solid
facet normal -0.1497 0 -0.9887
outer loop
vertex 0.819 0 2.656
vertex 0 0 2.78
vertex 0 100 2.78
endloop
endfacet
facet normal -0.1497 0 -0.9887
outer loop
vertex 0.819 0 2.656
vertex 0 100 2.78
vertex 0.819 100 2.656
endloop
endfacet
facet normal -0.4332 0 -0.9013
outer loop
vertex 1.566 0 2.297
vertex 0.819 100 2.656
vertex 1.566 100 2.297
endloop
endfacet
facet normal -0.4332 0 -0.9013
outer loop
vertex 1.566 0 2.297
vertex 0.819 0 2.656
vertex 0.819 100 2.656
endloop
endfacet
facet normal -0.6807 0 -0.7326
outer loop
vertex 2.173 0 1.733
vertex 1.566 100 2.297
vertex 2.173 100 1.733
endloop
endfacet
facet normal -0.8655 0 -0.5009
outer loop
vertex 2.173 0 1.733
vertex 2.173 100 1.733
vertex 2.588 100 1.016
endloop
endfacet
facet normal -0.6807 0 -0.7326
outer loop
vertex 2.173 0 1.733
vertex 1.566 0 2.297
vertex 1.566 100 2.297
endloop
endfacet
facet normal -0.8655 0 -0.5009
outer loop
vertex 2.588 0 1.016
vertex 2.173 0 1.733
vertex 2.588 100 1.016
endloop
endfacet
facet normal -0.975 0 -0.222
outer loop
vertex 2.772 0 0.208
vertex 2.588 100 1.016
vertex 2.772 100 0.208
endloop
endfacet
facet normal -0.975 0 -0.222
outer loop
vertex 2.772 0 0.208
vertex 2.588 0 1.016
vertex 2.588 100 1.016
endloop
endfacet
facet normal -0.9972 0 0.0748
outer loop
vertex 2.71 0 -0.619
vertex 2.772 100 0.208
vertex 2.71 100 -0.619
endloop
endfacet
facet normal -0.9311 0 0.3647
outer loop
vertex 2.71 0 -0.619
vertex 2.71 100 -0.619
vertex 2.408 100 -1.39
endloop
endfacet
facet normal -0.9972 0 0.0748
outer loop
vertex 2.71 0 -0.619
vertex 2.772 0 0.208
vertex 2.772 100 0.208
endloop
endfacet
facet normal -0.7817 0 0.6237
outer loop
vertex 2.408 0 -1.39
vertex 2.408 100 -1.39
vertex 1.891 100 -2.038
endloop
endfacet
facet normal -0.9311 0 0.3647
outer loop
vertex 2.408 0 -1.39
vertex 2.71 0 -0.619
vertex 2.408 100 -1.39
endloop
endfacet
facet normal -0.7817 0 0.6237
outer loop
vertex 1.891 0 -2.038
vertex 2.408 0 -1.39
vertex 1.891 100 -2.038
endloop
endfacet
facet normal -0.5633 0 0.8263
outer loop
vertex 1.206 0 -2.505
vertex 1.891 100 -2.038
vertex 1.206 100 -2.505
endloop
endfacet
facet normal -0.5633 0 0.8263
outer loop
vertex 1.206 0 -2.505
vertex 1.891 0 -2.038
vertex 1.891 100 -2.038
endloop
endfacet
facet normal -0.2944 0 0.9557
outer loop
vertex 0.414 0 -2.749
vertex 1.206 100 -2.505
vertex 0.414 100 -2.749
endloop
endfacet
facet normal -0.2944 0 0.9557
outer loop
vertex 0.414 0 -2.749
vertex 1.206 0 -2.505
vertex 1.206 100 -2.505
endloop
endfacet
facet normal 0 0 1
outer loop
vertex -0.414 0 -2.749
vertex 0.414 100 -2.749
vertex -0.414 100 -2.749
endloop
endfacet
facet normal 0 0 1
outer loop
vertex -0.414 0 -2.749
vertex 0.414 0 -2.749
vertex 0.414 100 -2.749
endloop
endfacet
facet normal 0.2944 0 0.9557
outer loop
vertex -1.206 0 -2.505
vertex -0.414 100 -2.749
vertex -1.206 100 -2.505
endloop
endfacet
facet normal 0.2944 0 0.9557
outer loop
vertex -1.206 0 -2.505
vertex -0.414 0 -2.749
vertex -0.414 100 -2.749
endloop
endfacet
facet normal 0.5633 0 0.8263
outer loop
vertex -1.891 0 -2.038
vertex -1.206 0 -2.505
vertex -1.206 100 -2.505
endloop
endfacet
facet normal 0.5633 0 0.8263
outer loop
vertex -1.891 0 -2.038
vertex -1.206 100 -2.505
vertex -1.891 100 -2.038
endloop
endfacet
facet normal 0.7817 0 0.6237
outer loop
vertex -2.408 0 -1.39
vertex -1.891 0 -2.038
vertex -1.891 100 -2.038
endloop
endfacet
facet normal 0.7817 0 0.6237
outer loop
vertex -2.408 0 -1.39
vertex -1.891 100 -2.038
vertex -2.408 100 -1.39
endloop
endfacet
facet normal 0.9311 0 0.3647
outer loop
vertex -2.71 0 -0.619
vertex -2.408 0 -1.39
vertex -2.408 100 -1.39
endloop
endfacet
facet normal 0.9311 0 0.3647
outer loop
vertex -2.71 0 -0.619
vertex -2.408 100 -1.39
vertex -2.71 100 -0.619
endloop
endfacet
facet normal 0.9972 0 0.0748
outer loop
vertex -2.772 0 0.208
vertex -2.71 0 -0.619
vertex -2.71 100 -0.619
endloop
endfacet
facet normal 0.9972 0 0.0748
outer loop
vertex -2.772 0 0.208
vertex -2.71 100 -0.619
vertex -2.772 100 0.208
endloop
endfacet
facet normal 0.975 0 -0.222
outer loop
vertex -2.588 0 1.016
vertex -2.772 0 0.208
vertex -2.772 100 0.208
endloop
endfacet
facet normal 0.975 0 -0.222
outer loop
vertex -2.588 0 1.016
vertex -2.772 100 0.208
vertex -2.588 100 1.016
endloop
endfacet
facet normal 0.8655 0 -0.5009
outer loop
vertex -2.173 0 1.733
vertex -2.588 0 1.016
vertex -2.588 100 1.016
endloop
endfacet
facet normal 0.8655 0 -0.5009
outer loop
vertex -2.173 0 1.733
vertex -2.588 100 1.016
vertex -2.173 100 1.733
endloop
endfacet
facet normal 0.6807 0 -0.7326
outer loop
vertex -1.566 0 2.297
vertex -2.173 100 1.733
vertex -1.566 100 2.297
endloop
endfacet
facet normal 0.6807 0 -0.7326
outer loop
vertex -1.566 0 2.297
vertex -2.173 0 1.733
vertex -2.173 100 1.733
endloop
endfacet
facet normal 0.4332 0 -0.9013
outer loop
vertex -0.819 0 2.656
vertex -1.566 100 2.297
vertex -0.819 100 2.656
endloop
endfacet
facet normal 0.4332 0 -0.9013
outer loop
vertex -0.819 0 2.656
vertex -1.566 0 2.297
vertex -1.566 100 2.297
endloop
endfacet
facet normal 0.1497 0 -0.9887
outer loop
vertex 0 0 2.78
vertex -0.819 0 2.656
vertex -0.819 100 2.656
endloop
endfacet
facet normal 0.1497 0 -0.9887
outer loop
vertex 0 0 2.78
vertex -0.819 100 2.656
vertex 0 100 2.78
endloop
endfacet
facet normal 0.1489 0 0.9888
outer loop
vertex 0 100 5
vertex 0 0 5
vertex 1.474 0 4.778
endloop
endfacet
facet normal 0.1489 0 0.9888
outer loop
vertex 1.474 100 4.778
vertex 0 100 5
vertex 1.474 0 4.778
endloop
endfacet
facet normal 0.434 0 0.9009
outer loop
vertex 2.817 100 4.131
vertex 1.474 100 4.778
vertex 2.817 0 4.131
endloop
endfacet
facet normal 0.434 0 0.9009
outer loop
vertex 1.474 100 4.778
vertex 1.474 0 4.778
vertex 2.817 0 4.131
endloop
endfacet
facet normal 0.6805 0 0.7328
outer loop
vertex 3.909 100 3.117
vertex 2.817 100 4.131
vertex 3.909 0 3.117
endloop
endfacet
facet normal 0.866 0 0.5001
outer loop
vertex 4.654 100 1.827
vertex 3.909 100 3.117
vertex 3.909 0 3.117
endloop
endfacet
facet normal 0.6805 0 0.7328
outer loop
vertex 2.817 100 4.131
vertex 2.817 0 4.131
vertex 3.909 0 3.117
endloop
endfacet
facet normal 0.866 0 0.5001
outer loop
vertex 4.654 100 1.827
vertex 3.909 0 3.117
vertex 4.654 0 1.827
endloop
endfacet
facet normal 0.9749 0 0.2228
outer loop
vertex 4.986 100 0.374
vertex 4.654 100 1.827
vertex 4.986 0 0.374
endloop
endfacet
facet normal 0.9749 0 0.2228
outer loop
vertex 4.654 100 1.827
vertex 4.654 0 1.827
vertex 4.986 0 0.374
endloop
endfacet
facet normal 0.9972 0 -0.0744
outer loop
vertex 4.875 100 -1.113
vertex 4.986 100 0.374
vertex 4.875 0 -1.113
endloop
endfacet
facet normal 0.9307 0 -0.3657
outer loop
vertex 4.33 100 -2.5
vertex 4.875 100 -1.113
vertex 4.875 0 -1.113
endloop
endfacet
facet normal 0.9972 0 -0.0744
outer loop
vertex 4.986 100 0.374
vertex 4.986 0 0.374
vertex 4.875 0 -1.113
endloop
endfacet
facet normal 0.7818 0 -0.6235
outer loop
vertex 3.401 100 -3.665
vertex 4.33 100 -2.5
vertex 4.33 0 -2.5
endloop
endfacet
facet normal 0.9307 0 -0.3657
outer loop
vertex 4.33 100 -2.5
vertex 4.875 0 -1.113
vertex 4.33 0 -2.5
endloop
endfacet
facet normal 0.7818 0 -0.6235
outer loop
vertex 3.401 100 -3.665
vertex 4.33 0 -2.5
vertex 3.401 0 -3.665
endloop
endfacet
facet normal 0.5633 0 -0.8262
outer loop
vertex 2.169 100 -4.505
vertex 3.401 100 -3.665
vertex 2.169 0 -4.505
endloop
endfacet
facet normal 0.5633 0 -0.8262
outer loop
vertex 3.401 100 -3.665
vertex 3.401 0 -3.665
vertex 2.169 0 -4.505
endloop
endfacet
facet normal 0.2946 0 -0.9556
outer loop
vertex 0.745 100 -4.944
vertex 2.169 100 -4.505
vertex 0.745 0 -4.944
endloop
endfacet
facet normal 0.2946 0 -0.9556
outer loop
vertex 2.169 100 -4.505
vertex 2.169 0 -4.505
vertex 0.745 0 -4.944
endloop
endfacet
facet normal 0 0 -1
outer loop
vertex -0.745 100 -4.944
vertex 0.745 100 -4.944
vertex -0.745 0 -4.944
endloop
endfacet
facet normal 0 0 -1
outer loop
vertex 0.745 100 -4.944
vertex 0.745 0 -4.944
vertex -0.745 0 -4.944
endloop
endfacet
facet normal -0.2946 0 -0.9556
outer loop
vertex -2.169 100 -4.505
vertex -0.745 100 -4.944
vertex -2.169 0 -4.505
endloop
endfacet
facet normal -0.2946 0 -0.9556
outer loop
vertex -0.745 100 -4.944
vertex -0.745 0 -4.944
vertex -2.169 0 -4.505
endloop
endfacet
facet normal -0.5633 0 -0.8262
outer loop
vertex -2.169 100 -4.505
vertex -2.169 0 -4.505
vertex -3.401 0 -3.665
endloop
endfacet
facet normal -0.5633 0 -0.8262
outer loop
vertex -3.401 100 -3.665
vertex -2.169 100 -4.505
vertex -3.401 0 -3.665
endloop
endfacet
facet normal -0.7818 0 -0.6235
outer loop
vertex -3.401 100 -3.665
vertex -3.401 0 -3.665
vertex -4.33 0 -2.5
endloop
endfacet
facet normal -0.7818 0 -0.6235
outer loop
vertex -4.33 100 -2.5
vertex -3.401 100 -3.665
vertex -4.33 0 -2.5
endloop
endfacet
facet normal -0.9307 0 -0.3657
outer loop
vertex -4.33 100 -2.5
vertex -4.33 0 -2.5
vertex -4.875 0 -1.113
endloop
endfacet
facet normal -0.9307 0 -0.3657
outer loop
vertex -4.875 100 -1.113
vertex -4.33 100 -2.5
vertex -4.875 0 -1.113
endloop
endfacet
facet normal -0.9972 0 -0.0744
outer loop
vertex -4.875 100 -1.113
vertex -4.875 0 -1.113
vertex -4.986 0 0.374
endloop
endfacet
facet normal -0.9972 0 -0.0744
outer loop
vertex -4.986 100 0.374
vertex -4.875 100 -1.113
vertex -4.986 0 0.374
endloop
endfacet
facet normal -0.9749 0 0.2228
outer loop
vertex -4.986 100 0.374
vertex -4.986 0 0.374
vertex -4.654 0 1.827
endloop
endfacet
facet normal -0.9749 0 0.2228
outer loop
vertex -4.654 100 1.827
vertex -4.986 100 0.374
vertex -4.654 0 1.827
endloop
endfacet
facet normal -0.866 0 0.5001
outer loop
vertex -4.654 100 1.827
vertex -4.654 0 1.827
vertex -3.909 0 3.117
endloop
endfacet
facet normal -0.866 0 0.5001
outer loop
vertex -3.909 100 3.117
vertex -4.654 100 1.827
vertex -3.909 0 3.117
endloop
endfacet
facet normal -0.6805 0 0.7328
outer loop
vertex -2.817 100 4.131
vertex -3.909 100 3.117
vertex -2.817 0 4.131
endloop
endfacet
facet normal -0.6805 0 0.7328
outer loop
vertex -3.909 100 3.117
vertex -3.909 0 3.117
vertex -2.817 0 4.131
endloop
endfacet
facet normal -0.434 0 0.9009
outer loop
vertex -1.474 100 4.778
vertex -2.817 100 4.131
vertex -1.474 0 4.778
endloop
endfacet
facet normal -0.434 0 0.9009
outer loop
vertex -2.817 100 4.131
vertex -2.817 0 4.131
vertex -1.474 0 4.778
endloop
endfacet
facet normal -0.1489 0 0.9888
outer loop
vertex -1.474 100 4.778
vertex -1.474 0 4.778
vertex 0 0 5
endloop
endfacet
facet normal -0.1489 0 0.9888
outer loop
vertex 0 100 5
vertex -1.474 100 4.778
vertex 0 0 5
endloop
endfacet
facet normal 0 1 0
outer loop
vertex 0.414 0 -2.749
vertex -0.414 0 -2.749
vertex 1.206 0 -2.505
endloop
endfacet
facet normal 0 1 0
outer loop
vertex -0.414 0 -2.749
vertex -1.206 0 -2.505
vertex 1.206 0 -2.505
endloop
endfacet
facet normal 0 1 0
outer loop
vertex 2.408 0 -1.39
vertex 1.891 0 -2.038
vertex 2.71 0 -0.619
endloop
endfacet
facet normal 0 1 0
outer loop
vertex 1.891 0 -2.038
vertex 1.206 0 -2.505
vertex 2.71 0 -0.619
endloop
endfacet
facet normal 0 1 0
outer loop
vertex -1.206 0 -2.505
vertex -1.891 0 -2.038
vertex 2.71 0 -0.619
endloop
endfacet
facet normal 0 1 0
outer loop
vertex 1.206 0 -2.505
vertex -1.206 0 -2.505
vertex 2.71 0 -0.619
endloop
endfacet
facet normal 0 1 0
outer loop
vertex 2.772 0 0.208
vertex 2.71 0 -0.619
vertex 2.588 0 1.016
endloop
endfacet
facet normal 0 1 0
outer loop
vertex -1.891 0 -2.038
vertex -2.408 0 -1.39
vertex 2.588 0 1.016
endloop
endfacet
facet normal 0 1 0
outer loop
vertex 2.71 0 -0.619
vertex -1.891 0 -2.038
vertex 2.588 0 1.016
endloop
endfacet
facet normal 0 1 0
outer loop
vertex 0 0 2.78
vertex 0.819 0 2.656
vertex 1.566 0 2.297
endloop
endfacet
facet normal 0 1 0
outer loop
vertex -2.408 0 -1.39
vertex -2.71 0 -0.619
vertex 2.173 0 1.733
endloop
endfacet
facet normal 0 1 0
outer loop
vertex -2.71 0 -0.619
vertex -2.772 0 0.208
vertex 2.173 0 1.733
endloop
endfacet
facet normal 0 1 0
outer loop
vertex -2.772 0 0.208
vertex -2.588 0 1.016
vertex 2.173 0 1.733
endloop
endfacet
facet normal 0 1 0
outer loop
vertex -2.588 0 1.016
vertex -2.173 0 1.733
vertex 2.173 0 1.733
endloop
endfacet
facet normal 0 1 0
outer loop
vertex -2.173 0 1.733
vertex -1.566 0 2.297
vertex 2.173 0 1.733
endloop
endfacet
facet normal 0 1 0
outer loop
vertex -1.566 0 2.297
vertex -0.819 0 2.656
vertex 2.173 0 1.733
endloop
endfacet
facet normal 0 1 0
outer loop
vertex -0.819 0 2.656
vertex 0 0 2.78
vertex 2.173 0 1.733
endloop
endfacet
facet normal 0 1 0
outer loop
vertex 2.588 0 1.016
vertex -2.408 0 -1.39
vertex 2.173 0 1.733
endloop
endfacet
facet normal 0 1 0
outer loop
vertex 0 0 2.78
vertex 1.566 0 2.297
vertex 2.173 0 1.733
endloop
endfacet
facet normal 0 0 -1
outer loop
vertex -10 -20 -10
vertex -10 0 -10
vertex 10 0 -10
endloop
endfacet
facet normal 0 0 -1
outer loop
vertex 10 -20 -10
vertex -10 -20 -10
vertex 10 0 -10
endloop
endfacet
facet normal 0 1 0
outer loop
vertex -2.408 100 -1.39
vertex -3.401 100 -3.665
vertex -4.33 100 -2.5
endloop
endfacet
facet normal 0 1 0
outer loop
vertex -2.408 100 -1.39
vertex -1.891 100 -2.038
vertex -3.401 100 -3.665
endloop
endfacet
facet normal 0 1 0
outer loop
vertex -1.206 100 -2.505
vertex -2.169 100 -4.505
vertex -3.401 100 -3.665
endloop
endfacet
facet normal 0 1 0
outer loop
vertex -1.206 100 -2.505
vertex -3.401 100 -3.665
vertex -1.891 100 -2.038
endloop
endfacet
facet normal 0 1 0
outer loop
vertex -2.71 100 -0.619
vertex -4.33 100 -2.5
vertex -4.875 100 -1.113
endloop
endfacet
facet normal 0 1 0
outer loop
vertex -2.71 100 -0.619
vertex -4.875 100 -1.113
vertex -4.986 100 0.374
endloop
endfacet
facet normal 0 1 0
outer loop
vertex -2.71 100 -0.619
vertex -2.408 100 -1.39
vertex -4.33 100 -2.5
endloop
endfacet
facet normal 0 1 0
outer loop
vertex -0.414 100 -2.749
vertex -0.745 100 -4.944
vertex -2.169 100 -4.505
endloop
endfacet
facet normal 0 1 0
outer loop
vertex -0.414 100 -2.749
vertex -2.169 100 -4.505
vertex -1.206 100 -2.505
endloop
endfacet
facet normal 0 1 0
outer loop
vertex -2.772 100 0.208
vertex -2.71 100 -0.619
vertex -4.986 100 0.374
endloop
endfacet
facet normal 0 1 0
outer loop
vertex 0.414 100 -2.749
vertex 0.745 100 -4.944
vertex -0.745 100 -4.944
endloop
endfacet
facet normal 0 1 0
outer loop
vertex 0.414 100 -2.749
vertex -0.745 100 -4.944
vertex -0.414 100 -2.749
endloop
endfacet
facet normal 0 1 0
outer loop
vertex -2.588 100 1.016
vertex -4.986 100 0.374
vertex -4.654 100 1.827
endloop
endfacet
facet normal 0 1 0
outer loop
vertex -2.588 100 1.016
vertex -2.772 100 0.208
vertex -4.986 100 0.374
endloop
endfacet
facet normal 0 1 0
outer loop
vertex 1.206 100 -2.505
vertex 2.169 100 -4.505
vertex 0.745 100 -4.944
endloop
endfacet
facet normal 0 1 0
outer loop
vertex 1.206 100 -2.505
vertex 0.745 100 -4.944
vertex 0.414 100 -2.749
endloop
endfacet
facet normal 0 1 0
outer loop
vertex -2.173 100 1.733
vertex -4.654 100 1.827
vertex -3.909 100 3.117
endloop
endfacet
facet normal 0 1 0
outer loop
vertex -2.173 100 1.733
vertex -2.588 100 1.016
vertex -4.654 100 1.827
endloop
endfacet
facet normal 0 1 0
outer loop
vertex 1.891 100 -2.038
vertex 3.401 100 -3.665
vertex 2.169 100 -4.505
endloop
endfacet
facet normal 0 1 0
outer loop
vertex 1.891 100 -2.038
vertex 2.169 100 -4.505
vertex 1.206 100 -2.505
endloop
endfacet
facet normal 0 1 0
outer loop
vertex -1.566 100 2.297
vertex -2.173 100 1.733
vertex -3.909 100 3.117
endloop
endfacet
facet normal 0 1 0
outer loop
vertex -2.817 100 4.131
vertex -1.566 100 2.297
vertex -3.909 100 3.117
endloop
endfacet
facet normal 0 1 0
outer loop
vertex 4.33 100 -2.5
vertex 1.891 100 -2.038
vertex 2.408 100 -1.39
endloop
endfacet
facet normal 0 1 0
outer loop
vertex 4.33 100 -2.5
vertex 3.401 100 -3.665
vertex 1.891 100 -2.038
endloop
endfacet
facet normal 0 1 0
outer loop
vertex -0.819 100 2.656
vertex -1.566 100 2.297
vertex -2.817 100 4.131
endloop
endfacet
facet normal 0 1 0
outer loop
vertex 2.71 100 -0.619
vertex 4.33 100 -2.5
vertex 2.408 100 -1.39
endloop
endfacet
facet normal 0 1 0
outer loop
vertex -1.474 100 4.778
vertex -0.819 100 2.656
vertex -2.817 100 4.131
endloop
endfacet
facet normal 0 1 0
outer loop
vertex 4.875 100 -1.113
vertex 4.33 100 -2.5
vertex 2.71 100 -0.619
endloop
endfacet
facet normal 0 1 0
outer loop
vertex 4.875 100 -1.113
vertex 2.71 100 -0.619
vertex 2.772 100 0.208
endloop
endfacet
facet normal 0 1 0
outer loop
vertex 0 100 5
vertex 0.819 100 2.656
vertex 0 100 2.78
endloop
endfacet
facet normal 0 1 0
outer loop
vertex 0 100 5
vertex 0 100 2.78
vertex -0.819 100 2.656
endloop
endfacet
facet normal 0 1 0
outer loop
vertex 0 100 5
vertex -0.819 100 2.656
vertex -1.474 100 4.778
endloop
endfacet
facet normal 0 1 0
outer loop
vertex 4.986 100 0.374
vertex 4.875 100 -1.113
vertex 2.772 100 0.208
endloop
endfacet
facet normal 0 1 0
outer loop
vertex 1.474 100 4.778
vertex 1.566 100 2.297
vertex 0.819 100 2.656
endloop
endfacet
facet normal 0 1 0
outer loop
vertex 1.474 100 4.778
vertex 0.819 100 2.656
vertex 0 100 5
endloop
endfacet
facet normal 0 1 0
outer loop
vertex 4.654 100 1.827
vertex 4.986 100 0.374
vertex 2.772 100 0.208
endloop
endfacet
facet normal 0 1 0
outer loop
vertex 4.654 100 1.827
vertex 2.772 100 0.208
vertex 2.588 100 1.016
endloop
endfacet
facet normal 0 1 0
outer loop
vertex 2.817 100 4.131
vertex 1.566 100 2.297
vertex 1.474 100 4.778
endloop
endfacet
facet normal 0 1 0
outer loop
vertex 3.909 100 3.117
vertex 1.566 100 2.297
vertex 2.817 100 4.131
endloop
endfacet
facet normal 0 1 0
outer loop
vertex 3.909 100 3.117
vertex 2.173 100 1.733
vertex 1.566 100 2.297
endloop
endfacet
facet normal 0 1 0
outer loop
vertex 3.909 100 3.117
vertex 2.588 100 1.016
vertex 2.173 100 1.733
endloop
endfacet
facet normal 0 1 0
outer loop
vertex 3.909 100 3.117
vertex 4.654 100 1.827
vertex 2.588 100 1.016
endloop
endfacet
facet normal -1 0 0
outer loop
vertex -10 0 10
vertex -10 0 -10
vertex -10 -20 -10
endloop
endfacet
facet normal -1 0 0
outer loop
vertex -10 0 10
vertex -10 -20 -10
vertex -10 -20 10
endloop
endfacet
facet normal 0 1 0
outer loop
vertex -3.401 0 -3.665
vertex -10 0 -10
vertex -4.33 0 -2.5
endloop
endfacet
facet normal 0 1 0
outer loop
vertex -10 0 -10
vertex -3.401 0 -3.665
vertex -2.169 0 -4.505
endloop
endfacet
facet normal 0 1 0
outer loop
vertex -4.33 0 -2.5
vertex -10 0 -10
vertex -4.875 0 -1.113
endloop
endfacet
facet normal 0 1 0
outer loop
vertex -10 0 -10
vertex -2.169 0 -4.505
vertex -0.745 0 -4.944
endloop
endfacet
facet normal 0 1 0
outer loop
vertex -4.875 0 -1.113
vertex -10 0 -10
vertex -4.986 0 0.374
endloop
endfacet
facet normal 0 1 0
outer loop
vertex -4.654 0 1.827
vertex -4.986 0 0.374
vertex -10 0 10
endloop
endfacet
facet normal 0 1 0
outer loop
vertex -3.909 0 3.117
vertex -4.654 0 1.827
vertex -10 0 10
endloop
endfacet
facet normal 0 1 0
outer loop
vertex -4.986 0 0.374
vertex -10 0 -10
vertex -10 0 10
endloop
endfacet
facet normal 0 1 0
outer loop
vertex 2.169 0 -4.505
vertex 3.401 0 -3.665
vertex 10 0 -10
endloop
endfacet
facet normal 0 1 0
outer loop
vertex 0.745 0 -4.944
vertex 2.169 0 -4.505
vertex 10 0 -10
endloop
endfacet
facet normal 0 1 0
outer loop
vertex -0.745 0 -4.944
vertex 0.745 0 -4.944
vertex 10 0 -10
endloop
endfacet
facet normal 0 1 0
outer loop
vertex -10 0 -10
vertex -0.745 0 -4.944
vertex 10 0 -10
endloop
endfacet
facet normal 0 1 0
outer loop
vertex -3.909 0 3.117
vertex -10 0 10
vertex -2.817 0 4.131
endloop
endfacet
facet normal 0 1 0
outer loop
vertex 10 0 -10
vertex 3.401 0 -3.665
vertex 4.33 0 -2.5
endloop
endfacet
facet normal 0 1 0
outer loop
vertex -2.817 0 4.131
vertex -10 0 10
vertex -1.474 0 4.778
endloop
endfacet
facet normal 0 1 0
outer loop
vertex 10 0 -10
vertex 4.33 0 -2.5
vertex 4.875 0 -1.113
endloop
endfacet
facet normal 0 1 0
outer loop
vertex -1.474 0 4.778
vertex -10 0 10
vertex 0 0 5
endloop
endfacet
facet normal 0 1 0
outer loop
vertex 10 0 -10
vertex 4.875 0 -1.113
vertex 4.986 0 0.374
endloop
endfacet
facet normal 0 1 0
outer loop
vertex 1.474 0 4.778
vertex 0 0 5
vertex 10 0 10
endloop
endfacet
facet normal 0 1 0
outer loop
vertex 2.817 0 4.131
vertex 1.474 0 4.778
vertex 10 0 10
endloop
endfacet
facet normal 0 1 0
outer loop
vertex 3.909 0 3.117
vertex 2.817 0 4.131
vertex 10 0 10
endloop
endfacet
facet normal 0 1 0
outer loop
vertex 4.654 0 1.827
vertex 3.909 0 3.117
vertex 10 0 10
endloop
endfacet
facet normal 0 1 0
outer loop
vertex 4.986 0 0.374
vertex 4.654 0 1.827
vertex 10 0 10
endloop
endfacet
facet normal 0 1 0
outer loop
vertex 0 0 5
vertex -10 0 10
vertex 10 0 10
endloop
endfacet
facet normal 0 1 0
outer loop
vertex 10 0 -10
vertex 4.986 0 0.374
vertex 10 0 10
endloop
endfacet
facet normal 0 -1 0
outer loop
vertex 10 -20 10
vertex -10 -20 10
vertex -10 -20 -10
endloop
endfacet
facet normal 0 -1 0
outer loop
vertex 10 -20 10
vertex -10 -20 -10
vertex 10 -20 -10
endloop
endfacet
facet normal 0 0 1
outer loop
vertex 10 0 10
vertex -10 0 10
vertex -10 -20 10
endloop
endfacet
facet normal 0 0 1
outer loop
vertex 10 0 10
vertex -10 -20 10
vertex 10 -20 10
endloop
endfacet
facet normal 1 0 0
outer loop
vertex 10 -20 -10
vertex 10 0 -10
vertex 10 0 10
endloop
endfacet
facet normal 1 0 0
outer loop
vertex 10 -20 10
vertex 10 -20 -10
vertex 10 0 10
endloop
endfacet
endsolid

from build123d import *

# Parameters (mm, degrees)
SKETCH1_R           = 5
SKETCH1_R_2         = 2.78
BOSS_EXTRUDE1_DEPTH = 100
SKETCH2_W           = 20
SKETCH2_H           = 20
BOSS_EXTRUDE2_DEPTH = 20


with BuildPart() as part:
    # Sketch1 → Boss-Extrude1 (new body)
    with BuildSketch(Plane(origin=(0, 0, 0), x_dir=(1, 0, 0), z_dir=(0, 1, 0))):
        Circle(SKETCH1_R)
        Circle(SKETCH1_R_2, mode=Mode.SUBTRACT)
    extrude(amount=BOSS_EXTRUDE1_DEPTH)

    # Sketch2 → Boss-Extrude2 (add)
    with BuildSketch(Plane.XZ):
        Rectangle(SKETCH2_W, SKETCH2_H)
    extrude(amount=BOSS_EXTRUDE2_DEPTH)


solid = part.part
